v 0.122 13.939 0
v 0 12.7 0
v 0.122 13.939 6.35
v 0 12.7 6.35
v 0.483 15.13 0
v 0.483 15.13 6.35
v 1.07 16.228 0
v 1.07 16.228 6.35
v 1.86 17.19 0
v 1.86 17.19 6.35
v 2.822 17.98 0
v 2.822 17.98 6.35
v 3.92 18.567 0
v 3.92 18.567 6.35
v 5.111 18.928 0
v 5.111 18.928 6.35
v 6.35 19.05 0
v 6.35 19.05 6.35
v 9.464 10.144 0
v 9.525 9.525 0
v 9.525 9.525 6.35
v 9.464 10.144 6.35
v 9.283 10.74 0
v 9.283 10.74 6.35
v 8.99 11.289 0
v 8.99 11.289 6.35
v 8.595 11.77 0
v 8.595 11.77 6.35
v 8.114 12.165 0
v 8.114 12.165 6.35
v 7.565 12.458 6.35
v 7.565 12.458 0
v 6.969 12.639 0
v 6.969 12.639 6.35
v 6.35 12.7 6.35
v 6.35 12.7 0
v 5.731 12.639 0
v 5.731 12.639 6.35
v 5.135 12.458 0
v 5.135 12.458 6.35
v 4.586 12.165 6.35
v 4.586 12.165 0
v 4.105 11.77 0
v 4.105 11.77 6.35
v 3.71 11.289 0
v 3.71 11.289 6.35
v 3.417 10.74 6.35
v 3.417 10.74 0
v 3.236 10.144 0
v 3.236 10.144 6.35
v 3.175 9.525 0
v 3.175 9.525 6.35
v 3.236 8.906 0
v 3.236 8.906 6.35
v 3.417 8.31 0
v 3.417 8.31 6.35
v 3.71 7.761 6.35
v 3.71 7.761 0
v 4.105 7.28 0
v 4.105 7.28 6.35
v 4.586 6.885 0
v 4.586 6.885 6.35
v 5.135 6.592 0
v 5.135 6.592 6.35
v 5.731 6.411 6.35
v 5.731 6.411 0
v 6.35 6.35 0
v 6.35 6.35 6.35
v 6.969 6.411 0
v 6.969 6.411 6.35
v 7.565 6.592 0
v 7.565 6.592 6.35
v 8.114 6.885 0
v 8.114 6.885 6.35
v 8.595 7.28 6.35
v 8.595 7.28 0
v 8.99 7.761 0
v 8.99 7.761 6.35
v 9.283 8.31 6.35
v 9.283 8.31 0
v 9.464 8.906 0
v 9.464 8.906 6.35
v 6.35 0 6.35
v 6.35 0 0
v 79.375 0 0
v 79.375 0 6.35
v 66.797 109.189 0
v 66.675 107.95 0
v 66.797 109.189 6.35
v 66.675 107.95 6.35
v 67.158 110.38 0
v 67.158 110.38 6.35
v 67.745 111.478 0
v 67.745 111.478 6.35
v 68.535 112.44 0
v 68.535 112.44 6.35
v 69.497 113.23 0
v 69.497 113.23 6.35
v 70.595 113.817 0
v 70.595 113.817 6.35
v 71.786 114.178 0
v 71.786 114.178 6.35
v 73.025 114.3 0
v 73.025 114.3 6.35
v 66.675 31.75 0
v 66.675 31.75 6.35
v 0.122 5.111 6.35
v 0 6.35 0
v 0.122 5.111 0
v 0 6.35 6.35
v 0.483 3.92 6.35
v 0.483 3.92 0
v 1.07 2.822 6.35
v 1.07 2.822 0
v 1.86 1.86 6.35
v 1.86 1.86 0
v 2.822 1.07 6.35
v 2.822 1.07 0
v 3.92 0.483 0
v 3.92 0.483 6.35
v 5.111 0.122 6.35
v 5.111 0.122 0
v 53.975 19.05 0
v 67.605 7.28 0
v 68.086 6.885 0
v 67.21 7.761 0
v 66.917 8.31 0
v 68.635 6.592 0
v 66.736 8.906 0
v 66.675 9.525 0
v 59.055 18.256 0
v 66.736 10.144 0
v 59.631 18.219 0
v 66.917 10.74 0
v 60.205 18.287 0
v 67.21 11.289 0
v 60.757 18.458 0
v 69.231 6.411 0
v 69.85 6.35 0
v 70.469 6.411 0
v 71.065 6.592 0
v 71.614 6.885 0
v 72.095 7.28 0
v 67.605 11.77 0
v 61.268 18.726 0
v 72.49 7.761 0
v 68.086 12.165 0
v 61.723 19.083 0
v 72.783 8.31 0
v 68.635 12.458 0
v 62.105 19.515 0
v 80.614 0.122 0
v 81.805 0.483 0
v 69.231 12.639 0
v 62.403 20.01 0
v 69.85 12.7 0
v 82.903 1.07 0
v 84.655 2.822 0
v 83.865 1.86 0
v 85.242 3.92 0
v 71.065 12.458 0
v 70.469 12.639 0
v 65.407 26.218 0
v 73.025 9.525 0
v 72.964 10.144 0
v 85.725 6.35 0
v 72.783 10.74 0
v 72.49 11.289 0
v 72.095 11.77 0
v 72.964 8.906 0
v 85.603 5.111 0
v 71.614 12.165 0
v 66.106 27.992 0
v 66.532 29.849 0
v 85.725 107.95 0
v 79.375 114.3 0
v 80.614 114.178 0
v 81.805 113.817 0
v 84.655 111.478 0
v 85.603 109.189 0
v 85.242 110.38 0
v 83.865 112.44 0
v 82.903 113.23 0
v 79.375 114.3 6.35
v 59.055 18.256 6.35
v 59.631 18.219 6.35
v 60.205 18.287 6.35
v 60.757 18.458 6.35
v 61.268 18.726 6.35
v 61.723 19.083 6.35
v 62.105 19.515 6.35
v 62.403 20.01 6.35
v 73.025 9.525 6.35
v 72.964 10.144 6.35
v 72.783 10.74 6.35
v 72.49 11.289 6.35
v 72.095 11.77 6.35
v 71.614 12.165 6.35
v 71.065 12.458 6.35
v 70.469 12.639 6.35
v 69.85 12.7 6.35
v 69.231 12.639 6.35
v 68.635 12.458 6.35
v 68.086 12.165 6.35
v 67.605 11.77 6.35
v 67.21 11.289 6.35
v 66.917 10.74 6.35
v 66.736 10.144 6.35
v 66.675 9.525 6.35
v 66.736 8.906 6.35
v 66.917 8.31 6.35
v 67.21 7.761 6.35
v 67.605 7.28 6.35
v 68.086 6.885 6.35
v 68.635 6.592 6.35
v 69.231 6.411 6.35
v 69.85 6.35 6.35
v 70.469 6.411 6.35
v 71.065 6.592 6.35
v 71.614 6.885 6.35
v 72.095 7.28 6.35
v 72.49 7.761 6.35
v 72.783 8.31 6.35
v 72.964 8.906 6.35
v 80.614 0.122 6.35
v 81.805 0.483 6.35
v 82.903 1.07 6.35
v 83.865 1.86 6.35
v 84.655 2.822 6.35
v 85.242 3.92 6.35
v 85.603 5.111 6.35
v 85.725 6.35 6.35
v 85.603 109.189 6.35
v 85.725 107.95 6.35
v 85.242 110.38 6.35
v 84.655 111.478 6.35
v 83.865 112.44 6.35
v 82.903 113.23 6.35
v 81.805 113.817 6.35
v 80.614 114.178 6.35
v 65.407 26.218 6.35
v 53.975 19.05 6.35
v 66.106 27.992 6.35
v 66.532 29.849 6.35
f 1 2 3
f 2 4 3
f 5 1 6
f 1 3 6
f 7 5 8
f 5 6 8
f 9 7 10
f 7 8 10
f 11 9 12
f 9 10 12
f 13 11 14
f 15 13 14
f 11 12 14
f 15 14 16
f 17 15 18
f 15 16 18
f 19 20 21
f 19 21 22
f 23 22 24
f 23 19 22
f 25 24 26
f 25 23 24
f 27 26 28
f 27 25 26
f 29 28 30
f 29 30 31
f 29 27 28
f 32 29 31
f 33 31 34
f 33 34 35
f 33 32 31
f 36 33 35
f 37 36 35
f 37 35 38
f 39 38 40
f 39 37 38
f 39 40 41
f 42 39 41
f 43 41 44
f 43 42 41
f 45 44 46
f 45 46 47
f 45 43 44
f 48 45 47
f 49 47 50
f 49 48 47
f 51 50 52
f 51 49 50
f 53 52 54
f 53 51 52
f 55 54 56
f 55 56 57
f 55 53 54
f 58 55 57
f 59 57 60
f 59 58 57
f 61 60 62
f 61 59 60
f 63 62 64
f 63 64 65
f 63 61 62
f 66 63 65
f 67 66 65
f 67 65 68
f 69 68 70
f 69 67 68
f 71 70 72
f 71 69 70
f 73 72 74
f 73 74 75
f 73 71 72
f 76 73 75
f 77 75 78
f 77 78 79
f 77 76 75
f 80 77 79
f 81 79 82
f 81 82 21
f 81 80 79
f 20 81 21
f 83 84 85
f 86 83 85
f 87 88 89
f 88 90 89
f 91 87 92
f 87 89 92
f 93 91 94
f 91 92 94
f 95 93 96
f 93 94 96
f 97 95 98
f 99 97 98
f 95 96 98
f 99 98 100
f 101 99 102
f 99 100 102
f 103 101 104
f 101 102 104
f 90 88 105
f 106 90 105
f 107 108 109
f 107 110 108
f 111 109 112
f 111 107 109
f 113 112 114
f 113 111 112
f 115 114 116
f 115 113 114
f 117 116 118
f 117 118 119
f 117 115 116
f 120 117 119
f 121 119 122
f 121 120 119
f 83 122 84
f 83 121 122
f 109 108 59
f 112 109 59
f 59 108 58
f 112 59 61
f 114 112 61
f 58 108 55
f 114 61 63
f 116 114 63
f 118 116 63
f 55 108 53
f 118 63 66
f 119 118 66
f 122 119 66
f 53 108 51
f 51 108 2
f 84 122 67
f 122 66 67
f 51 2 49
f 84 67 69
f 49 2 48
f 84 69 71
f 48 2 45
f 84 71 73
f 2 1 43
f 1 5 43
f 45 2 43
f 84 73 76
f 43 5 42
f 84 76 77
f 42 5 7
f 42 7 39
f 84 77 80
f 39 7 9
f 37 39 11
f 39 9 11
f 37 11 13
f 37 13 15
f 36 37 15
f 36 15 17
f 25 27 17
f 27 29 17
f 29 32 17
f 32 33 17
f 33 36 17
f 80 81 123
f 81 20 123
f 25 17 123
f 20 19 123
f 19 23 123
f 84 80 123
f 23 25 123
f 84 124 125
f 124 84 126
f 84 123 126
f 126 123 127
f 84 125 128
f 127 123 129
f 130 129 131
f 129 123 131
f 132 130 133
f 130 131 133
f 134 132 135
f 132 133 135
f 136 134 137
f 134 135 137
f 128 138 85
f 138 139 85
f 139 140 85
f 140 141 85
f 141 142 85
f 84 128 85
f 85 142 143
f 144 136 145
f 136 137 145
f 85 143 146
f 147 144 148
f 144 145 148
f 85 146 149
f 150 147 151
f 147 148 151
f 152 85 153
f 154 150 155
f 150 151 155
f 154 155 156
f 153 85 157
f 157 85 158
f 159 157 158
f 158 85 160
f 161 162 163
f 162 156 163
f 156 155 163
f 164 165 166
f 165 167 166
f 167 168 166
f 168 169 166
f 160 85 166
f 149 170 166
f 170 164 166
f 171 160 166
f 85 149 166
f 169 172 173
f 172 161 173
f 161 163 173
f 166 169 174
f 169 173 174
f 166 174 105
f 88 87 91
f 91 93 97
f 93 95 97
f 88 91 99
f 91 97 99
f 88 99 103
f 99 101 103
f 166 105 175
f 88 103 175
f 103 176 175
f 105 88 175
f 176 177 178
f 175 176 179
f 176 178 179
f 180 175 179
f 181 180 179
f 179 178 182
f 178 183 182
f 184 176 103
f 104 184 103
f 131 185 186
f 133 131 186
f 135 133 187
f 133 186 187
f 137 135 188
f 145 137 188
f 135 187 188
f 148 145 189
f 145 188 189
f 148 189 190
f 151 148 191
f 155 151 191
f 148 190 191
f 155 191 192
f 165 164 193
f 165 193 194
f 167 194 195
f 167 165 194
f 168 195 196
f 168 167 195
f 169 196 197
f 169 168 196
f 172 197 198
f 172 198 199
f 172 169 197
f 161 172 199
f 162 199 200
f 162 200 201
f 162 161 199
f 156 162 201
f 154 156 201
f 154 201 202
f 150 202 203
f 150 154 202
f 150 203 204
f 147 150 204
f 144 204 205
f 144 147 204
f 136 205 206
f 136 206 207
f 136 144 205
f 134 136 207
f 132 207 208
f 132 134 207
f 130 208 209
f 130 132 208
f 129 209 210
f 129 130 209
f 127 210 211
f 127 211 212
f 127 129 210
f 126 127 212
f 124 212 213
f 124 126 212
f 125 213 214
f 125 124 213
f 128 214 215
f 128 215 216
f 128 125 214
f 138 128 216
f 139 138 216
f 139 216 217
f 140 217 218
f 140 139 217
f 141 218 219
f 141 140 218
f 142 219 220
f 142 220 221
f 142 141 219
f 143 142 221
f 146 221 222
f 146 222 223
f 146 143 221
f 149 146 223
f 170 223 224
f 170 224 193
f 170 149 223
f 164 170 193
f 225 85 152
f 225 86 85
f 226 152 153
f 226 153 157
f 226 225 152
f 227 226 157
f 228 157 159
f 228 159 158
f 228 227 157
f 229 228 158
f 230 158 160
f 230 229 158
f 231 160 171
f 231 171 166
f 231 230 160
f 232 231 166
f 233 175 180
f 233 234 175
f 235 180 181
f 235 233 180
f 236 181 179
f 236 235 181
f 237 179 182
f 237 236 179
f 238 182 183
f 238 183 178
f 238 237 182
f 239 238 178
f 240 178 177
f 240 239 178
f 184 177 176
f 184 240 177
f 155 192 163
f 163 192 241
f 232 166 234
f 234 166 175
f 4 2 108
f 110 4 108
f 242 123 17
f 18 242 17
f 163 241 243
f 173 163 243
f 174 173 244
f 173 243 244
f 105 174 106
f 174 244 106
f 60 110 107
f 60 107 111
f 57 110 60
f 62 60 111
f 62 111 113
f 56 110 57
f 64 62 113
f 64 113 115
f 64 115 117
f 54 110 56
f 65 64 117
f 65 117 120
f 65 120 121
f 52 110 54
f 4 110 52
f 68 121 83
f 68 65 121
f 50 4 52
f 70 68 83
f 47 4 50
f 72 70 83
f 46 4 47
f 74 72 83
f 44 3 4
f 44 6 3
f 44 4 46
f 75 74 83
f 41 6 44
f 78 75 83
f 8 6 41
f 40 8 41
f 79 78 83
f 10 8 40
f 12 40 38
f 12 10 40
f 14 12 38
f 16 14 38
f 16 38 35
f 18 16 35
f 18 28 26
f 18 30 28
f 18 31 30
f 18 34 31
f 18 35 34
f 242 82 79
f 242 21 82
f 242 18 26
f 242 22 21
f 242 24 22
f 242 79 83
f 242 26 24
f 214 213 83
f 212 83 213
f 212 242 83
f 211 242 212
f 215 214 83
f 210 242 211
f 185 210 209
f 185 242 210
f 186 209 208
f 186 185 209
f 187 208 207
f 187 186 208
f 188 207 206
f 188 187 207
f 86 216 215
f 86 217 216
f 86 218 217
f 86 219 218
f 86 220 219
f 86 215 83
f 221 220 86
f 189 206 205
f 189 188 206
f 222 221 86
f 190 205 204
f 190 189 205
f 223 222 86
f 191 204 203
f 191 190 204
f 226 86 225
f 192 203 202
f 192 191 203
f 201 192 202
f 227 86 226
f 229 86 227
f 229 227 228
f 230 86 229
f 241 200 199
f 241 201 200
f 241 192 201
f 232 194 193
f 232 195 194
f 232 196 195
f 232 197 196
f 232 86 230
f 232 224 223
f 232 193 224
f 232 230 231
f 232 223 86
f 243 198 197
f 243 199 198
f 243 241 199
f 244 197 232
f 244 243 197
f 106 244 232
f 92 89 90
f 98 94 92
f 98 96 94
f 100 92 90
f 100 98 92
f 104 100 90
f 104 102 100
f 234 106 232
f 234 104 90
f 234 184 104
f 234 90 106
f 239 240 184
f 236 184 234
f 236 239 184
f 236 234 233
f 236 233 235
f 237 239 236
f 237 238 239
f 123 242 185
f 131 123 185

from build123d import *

# Parameters (mm, degrees)
SKETCH1_R           = 3.175
BOSS_EXTRUDE1_DEPTH = 6.35
FILLET1_R           = 6.35
FILLET2_R           = 12.7
CUT_EXTRUDE1_DEPTH  = 7.35


with BuildPart() as part:
    # Sketch1 → Boss-Extrude1 (new body)
    with BuildSketch(Plane.XY):
        Polygon((0, 19.05), (0, 0), (85.725, 0), (85.725, 114.3), (66.675, 114.3), (66.675, 19.05), align=None)
        with Locations((69.85, 9.525)):
            Circle(SKETCH1_R, mode=Mode.SUBTRACT)
        with Locations((6.35, 9.525)):
            Circle(SKETCH1_R, mode=Mode.SUBTRACT)
    extrude(amount=BOSS_EXTRUDE1_DEPTH)

    # Fillet1
    fillet1_edges = [part.edges().sort_by_distance(p)[0] for p in [
        (66.675, 114.3, 3.175),
        (85.725, 114.3, 3.175),
        (85.725, 0, 3.175),
        (0, 0, 3.175),
        (0, 19.05, 3.175),
    ]]
    fillet(fillet1_edges, radius=FILLET1_R)

    # Fillet2
    fillet2_edges = [part.edges().sort_by_distance(p)[0] for p in [
        (66.675, 19.05, 3.175),
    ]]
    fillet(fillet2_edges, radius=FILLET2_R)

    # Sketch2 → Cut-Extrude1 (cut, through all)
    with BuildSketch(Plane.XY.offset(6.35)):
        with BuildLine():
            Line((53.975, 19.05), (59.055, 18.25625))
            ThreePointArc((59.055, 18.25625), (57.942186014, 18.652541864), (57.051260526, 19.42820544))
            ThreePointArc((57.051260526, 19.42820544), (55.524711116, 19.144905972), (53.975, 19.05))
        make_face()
        with BuildLine():
            ThreePointArc((57.051260526, 19.42820544), (57.942186014, 18.652541864), (59.055, 18.25625))
            ThreePointArc((59.055, 18.25625), (61.018534307, 18.580759781), (62.403160549, 20.010299477))
            ThreePointArc((62.403160549, 20.010299477), (62.639885623, 20.683811475), (62.720146595, 21.393188207))
            ThreePointArc((62.720146595, 21.393188207), (62.67970364, 21.89833881), (62.559405095, 22.390620257))
            ThreePointArc((62.559405095, 22.390620257), (59.990542874, 20.565043856), (57.051260526, 19.42820544))
        make_face()
        with BuildLine():
            ThreePointArc((62.720146595, 21.393188207), (62.639885623, 20.683811475), (62.403160549, 20.010299477))
            Line((62.403160549, 20.010299477), (65.407055815, 26.21844508))
            ThreePointArc((65.407055815, 26.21844508), (64.164589666, 24.169613306), (62.559405095, 22.390620257))
            ThreePointArc((62.559405095, 22.390620257), (62.67970364, 21.89833881), (62.720146595, 21.393188207))
        make_face()
    extrude(amount=-CUT_EXTRUDE1_DEPTH, mode=Mode.SUBTRACT)


solid = part.part
